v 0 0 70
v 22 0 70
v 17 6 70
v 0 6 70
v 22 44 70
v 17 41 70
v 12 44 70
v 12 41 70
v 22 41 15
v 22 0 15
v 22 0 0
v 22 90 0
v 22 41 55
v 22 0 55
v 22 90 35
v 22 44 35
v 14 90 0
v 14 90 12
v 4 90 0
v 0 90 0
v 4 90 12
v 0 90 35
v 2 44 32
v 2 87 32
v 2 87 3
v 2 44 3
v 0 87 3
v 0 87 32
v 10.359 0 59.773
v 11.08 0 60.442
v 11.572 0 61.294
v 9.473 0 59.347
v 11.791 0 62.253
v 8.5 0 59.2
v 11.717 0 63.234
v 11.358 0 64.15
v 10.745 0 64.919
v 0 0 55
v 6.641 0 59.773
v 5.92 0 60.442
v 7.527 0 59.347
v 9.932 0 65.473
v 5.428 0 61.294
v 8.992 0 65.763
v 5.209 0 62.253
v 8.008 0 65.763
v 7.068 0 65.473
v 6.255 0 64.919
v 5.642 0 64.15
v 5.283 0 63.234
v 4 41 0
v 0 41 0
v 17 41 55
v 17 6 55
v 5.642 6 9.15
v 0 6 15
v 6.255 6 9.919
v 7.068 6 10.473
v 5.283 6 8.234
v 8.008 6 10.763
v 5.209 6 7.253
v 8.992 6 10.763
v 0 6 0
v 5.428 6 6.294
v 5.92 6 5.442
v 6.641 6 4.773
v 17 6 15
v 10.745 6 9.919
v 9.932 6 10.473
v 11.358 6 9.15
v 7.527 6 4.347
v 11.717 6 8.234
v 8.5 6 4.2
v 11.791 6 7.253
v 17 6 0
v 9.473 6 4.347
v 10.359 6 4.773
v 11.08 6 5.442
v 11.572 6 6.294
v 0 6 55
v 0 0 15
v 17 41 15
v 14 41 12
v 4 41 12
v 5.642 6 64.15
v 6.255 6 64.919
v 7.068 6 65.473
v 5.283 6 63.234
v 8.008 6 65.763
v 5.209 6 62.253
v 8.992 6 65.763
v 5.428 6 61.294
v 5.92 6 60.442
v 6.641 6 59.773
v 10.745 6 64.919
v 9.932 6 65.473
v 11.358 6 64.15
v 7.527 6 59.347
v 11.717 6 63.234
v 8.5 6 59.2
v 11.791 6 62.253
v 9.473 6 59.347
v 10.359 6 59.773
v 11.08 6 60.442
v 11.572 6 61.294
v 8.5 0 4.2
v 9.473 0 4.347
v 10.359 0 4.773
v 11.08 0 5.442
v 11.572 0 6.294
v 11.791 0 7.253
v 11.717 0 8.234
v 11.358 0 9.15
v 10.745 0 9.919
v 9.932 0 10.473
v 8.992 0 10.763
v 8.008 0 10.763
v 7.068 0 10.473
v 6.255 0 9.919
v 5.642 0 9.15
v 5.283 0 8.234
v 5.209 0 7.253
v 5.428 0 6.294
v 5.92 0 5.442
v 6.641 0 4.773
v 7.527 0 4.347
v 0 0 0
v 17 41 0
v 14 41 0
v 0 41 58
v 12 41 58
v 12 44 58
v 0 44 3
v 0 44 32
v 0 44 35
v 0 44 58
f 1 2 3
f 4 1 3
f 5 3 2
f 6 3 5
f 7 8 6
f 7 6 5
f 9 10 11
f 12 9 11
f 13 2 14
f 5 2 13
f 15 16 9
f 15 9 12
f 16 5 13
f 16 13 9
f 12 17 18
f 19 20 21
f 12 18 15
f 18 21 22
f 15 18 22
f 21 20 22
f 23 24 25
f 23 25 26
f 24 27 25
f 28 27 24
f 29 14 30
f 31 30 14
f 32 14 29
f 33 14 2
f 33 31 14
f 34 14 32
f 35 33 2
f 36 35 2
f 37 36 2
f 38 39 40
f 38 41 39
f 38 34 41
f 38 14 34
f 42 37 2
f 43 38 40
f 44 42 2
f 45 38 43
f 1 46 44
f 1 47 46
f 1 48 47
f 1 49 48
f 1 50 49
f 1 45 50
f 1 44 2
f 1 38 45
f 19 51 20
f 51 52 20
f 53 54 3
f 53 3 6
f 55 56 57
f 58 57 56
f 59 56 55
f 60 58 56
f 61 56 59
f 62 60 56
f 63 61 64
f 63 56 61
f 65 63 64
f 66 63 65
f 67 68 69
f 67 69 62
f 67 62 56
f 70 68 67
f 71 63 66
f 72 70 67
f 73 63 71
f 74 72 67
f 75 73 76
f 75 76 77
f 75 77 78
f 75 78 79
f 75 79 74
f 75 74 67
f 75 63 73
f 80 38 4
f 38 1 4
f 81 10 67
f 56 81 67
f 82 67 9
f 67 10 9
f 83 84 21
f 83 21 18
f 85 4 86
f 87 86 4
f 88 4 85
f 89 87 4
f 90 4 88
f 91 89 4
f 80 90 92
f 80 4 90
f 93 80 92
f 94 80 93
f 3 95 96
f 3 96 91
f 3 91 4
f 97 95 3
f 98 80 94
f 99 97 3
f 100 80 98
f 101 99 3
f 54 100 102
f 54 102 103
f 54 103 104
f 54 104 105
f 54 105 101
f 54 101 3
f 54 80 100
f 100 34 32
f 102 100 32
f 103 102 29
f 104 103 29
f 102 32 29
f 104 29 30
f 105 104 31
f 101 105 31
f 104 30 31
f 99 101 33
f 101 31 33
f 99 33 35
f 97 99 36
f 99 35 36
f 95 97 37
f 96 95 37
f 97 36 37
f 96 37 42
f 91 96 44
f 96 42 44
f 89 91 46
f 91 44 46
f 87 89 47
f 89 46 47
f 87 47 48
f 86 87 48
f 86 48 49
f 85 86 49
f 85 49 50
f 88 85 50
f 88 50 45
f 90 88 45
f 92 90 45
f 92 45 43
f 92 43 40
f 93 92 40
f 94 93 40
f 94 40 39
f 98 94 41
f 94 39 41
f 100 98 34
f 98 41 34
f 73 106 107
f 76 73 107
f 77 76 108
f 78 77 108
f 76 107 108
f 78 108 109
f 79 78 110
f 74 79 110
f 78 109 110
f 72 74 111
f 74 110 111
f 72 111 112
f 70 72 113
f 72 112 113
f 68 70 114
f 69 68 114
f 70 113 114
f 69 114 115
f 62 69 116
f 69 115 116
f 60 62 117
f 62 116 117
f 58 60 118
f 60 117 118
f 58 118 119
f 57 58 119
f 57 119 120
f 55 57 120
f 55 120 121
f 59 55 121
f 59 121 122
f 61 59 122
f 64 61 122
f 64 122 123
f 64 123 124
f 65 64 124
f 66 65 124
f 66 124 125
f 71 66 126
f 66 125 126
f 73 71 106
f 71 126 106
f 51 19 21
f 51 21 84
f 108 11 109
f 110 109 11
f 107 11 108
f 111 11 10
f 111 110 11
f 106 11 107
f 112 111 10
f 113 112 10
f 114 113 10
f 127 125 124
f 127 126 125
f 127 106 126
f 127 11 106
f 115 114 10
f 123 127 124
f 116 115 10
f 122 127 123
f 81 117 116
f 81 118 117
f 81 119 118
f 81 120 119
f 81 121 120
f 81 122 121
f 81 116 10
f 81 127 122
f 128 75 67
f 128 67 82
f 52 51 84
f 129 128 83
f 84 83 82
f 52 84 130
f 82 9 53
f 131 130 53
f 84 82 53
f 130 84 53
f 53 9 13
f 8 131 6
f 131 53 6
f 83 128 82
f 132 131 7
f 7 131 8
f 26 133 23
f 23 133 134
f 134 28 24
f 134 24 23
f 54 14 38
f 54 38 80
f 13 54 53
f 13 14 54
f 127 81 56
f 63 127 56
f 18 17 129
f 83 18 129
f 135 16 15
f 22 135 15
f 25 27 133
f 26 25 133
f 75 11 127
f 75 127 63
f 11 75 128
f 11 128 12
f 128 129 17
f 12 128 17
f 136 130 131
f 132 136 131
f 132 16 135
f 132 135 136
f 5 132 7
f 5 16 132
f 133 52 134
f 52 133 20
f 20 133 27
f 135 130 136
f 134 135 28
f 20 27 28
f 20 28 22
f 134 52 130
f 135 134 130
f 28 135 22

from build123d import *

# Parameters (mm, degrees)
SKETCH001_W  = 41
SKETCH001_H  = 40
PAD001_DEPTH = 22
SKETCH002_W  = 46
SKETCH002_H  = 35
PAD002_DEPTH = 22
SKETCH003_W  = 35
SKETCH003_H  = 17
PAD003_DEPTH = 70
SKETCH004_W  = 43
SKETCH004_H  = 29
PAD004_DEPTH = 2
SKETCH008_R  = 3.3
PAD006_DEPTH = 6
SKETCH007_R  = 3.3
PAD005_DEPTH = 6
SKETCH009_W  = 12
SKETCH009_H  = 12
PAD007_DEPTH = 3
SKETCH010_W  = 10
SKETCH010_H  = 49
PAD008_DEPTH = 12
SKETCH_W     = 90
SKETCH_H     = 70
PAD_DEPTH    = 22


with BuildPart() as body001:
    # Sketch001 (on Face1 of CopyPad) → Pad001 (new body)
    with BuildSketch(Plane.YZ.offset(22)):
        with Locations((20.5, 35)):
            Rectangle(SKETCH001_W, SKETCH001_H)
    extrude(amount=-PAD001_DEPTH)


with BuildPart() as body002:
    # Sketch002 (on Face1 of CopyPad001) → Pad002 (new body)
    with BuildSketch(Plane.YZ.offset(22)):
        with Locations((67, 52.5)):
            Rectangle(SKETCH002_W, SKETCH002_H)
    extrude(amount=-PAD002_DEPTH)


with BuildPart() as body003:
    # Sketch003 (on Face1 of CopyBoolean001) → Pad003 (new body)
    with BuildSketch(Plane.YX):
        with Locations((23.5, 8.5)):
            Rectangle(SKETCH003_W, SKETCH003_H)
    extrude(amount=-PAD003_DEPTH)


with BuildPart() as body004:
    # Sketch004 (on Face1 of CopyBoolean002) → Pad004 (new body)
    with BuildSketch(Plane(origin=(0, 0, 0), x_dir=(0, -1, 0), z_dir=(-1, 0, 0))):
        with Locations((-65.5, 17.5)):
            Rectangle(SKETCH004_W, SKETCH004_H)
    extrude(amount=-PAD004_DEPTH)


with BuildPart() as body007:
    # Sketch008 → Pad006 (new body)
    with BuildSketch(Plane(origin=(0, 0, 0), x_dir=(0, 0, -1), z_dir=(0, -1, 0))):
        with Locations((-7.5, 8.5)):
            Circle(SKETCH008_R)
    extrude(amount=-PAD006_DEPTH)


with BuildPart() as body007_1:
    # Body007 placement: moved
    add(body007.part.moved(Location((0, 0, 55))))


with BuildPart() as body006:
    # Sketch007 → Pad005 (new body)
    with BuildSketch(Plane(origin=(0, 0, 0), x_dir=(0, 0, -1), z_dir=(0, -1, 0))):
        with Locations((-7.5, 8.5)):
            Circle(SKETCH007_R)
    extrude(amount=-PAD005_DEPTH)


with BuildPart() as body008:
    # Sketch009 (on Face1 of CopyBoolean005) → Pad007 (new body)
    with BuildSketch(Plane.XZ.offset(-41)):
        with Locations((6, 64)):
            Rectangle(SKETCH009_W, SKETCH009_H)
    extrude(amount=-PAD007_DEPTH)


with BuildPart() as body009:
    # Sketch010 (on Face1 of CopyBoolean006) → Pad008 (new body)
    with BuildSketch(Plane(origin=(0, 0, 0), x_dir=(1, 0, 0), z_dir=(0, 0, -1))):
        with Locations((9, -65.5)):
            Rectangle(SKETCH010_W, SKETCH010_H)
    extrude(amount=-PAD008_DEPTH)


with BuildPart() as body:
    # Sketch → Pad (new body)
    with BuildSketch(Plane.YZ):
        with Locations((45, 35)):
            Rectangle(SKETCH_W, SKETCH_H)
    extrude(amount=PAD_DEPTH)

    # Boolean: cut Body001
    add(body001.part, mode=Mode.SUBTRACT)

    # Boolean001: cut Body002
    add(body002.part, mode=Mode.SUBTRACT)

    # Boolean002: cut Body003
    add(body003.part, mode=Mode.SUBTRACT)

    # Boolean003: cut Body004
    add(body004.part, mode=Mode.SUBTRACT)

    # Boolean004: cut Body007
    add(body007_1.part, mode=Mode.SUBTRACT)

    # Boolean005: cut Body006
    add(body006.part, mode=Mode.SUBTRACT)

    # Boolean006: cut Body008
    add(body008.part, mode=Mode.SUBTRACT)

    # Boolean007: cut Body009
    add(body009.part, mode=Mode.SUBTRACT)


solid = body.part
